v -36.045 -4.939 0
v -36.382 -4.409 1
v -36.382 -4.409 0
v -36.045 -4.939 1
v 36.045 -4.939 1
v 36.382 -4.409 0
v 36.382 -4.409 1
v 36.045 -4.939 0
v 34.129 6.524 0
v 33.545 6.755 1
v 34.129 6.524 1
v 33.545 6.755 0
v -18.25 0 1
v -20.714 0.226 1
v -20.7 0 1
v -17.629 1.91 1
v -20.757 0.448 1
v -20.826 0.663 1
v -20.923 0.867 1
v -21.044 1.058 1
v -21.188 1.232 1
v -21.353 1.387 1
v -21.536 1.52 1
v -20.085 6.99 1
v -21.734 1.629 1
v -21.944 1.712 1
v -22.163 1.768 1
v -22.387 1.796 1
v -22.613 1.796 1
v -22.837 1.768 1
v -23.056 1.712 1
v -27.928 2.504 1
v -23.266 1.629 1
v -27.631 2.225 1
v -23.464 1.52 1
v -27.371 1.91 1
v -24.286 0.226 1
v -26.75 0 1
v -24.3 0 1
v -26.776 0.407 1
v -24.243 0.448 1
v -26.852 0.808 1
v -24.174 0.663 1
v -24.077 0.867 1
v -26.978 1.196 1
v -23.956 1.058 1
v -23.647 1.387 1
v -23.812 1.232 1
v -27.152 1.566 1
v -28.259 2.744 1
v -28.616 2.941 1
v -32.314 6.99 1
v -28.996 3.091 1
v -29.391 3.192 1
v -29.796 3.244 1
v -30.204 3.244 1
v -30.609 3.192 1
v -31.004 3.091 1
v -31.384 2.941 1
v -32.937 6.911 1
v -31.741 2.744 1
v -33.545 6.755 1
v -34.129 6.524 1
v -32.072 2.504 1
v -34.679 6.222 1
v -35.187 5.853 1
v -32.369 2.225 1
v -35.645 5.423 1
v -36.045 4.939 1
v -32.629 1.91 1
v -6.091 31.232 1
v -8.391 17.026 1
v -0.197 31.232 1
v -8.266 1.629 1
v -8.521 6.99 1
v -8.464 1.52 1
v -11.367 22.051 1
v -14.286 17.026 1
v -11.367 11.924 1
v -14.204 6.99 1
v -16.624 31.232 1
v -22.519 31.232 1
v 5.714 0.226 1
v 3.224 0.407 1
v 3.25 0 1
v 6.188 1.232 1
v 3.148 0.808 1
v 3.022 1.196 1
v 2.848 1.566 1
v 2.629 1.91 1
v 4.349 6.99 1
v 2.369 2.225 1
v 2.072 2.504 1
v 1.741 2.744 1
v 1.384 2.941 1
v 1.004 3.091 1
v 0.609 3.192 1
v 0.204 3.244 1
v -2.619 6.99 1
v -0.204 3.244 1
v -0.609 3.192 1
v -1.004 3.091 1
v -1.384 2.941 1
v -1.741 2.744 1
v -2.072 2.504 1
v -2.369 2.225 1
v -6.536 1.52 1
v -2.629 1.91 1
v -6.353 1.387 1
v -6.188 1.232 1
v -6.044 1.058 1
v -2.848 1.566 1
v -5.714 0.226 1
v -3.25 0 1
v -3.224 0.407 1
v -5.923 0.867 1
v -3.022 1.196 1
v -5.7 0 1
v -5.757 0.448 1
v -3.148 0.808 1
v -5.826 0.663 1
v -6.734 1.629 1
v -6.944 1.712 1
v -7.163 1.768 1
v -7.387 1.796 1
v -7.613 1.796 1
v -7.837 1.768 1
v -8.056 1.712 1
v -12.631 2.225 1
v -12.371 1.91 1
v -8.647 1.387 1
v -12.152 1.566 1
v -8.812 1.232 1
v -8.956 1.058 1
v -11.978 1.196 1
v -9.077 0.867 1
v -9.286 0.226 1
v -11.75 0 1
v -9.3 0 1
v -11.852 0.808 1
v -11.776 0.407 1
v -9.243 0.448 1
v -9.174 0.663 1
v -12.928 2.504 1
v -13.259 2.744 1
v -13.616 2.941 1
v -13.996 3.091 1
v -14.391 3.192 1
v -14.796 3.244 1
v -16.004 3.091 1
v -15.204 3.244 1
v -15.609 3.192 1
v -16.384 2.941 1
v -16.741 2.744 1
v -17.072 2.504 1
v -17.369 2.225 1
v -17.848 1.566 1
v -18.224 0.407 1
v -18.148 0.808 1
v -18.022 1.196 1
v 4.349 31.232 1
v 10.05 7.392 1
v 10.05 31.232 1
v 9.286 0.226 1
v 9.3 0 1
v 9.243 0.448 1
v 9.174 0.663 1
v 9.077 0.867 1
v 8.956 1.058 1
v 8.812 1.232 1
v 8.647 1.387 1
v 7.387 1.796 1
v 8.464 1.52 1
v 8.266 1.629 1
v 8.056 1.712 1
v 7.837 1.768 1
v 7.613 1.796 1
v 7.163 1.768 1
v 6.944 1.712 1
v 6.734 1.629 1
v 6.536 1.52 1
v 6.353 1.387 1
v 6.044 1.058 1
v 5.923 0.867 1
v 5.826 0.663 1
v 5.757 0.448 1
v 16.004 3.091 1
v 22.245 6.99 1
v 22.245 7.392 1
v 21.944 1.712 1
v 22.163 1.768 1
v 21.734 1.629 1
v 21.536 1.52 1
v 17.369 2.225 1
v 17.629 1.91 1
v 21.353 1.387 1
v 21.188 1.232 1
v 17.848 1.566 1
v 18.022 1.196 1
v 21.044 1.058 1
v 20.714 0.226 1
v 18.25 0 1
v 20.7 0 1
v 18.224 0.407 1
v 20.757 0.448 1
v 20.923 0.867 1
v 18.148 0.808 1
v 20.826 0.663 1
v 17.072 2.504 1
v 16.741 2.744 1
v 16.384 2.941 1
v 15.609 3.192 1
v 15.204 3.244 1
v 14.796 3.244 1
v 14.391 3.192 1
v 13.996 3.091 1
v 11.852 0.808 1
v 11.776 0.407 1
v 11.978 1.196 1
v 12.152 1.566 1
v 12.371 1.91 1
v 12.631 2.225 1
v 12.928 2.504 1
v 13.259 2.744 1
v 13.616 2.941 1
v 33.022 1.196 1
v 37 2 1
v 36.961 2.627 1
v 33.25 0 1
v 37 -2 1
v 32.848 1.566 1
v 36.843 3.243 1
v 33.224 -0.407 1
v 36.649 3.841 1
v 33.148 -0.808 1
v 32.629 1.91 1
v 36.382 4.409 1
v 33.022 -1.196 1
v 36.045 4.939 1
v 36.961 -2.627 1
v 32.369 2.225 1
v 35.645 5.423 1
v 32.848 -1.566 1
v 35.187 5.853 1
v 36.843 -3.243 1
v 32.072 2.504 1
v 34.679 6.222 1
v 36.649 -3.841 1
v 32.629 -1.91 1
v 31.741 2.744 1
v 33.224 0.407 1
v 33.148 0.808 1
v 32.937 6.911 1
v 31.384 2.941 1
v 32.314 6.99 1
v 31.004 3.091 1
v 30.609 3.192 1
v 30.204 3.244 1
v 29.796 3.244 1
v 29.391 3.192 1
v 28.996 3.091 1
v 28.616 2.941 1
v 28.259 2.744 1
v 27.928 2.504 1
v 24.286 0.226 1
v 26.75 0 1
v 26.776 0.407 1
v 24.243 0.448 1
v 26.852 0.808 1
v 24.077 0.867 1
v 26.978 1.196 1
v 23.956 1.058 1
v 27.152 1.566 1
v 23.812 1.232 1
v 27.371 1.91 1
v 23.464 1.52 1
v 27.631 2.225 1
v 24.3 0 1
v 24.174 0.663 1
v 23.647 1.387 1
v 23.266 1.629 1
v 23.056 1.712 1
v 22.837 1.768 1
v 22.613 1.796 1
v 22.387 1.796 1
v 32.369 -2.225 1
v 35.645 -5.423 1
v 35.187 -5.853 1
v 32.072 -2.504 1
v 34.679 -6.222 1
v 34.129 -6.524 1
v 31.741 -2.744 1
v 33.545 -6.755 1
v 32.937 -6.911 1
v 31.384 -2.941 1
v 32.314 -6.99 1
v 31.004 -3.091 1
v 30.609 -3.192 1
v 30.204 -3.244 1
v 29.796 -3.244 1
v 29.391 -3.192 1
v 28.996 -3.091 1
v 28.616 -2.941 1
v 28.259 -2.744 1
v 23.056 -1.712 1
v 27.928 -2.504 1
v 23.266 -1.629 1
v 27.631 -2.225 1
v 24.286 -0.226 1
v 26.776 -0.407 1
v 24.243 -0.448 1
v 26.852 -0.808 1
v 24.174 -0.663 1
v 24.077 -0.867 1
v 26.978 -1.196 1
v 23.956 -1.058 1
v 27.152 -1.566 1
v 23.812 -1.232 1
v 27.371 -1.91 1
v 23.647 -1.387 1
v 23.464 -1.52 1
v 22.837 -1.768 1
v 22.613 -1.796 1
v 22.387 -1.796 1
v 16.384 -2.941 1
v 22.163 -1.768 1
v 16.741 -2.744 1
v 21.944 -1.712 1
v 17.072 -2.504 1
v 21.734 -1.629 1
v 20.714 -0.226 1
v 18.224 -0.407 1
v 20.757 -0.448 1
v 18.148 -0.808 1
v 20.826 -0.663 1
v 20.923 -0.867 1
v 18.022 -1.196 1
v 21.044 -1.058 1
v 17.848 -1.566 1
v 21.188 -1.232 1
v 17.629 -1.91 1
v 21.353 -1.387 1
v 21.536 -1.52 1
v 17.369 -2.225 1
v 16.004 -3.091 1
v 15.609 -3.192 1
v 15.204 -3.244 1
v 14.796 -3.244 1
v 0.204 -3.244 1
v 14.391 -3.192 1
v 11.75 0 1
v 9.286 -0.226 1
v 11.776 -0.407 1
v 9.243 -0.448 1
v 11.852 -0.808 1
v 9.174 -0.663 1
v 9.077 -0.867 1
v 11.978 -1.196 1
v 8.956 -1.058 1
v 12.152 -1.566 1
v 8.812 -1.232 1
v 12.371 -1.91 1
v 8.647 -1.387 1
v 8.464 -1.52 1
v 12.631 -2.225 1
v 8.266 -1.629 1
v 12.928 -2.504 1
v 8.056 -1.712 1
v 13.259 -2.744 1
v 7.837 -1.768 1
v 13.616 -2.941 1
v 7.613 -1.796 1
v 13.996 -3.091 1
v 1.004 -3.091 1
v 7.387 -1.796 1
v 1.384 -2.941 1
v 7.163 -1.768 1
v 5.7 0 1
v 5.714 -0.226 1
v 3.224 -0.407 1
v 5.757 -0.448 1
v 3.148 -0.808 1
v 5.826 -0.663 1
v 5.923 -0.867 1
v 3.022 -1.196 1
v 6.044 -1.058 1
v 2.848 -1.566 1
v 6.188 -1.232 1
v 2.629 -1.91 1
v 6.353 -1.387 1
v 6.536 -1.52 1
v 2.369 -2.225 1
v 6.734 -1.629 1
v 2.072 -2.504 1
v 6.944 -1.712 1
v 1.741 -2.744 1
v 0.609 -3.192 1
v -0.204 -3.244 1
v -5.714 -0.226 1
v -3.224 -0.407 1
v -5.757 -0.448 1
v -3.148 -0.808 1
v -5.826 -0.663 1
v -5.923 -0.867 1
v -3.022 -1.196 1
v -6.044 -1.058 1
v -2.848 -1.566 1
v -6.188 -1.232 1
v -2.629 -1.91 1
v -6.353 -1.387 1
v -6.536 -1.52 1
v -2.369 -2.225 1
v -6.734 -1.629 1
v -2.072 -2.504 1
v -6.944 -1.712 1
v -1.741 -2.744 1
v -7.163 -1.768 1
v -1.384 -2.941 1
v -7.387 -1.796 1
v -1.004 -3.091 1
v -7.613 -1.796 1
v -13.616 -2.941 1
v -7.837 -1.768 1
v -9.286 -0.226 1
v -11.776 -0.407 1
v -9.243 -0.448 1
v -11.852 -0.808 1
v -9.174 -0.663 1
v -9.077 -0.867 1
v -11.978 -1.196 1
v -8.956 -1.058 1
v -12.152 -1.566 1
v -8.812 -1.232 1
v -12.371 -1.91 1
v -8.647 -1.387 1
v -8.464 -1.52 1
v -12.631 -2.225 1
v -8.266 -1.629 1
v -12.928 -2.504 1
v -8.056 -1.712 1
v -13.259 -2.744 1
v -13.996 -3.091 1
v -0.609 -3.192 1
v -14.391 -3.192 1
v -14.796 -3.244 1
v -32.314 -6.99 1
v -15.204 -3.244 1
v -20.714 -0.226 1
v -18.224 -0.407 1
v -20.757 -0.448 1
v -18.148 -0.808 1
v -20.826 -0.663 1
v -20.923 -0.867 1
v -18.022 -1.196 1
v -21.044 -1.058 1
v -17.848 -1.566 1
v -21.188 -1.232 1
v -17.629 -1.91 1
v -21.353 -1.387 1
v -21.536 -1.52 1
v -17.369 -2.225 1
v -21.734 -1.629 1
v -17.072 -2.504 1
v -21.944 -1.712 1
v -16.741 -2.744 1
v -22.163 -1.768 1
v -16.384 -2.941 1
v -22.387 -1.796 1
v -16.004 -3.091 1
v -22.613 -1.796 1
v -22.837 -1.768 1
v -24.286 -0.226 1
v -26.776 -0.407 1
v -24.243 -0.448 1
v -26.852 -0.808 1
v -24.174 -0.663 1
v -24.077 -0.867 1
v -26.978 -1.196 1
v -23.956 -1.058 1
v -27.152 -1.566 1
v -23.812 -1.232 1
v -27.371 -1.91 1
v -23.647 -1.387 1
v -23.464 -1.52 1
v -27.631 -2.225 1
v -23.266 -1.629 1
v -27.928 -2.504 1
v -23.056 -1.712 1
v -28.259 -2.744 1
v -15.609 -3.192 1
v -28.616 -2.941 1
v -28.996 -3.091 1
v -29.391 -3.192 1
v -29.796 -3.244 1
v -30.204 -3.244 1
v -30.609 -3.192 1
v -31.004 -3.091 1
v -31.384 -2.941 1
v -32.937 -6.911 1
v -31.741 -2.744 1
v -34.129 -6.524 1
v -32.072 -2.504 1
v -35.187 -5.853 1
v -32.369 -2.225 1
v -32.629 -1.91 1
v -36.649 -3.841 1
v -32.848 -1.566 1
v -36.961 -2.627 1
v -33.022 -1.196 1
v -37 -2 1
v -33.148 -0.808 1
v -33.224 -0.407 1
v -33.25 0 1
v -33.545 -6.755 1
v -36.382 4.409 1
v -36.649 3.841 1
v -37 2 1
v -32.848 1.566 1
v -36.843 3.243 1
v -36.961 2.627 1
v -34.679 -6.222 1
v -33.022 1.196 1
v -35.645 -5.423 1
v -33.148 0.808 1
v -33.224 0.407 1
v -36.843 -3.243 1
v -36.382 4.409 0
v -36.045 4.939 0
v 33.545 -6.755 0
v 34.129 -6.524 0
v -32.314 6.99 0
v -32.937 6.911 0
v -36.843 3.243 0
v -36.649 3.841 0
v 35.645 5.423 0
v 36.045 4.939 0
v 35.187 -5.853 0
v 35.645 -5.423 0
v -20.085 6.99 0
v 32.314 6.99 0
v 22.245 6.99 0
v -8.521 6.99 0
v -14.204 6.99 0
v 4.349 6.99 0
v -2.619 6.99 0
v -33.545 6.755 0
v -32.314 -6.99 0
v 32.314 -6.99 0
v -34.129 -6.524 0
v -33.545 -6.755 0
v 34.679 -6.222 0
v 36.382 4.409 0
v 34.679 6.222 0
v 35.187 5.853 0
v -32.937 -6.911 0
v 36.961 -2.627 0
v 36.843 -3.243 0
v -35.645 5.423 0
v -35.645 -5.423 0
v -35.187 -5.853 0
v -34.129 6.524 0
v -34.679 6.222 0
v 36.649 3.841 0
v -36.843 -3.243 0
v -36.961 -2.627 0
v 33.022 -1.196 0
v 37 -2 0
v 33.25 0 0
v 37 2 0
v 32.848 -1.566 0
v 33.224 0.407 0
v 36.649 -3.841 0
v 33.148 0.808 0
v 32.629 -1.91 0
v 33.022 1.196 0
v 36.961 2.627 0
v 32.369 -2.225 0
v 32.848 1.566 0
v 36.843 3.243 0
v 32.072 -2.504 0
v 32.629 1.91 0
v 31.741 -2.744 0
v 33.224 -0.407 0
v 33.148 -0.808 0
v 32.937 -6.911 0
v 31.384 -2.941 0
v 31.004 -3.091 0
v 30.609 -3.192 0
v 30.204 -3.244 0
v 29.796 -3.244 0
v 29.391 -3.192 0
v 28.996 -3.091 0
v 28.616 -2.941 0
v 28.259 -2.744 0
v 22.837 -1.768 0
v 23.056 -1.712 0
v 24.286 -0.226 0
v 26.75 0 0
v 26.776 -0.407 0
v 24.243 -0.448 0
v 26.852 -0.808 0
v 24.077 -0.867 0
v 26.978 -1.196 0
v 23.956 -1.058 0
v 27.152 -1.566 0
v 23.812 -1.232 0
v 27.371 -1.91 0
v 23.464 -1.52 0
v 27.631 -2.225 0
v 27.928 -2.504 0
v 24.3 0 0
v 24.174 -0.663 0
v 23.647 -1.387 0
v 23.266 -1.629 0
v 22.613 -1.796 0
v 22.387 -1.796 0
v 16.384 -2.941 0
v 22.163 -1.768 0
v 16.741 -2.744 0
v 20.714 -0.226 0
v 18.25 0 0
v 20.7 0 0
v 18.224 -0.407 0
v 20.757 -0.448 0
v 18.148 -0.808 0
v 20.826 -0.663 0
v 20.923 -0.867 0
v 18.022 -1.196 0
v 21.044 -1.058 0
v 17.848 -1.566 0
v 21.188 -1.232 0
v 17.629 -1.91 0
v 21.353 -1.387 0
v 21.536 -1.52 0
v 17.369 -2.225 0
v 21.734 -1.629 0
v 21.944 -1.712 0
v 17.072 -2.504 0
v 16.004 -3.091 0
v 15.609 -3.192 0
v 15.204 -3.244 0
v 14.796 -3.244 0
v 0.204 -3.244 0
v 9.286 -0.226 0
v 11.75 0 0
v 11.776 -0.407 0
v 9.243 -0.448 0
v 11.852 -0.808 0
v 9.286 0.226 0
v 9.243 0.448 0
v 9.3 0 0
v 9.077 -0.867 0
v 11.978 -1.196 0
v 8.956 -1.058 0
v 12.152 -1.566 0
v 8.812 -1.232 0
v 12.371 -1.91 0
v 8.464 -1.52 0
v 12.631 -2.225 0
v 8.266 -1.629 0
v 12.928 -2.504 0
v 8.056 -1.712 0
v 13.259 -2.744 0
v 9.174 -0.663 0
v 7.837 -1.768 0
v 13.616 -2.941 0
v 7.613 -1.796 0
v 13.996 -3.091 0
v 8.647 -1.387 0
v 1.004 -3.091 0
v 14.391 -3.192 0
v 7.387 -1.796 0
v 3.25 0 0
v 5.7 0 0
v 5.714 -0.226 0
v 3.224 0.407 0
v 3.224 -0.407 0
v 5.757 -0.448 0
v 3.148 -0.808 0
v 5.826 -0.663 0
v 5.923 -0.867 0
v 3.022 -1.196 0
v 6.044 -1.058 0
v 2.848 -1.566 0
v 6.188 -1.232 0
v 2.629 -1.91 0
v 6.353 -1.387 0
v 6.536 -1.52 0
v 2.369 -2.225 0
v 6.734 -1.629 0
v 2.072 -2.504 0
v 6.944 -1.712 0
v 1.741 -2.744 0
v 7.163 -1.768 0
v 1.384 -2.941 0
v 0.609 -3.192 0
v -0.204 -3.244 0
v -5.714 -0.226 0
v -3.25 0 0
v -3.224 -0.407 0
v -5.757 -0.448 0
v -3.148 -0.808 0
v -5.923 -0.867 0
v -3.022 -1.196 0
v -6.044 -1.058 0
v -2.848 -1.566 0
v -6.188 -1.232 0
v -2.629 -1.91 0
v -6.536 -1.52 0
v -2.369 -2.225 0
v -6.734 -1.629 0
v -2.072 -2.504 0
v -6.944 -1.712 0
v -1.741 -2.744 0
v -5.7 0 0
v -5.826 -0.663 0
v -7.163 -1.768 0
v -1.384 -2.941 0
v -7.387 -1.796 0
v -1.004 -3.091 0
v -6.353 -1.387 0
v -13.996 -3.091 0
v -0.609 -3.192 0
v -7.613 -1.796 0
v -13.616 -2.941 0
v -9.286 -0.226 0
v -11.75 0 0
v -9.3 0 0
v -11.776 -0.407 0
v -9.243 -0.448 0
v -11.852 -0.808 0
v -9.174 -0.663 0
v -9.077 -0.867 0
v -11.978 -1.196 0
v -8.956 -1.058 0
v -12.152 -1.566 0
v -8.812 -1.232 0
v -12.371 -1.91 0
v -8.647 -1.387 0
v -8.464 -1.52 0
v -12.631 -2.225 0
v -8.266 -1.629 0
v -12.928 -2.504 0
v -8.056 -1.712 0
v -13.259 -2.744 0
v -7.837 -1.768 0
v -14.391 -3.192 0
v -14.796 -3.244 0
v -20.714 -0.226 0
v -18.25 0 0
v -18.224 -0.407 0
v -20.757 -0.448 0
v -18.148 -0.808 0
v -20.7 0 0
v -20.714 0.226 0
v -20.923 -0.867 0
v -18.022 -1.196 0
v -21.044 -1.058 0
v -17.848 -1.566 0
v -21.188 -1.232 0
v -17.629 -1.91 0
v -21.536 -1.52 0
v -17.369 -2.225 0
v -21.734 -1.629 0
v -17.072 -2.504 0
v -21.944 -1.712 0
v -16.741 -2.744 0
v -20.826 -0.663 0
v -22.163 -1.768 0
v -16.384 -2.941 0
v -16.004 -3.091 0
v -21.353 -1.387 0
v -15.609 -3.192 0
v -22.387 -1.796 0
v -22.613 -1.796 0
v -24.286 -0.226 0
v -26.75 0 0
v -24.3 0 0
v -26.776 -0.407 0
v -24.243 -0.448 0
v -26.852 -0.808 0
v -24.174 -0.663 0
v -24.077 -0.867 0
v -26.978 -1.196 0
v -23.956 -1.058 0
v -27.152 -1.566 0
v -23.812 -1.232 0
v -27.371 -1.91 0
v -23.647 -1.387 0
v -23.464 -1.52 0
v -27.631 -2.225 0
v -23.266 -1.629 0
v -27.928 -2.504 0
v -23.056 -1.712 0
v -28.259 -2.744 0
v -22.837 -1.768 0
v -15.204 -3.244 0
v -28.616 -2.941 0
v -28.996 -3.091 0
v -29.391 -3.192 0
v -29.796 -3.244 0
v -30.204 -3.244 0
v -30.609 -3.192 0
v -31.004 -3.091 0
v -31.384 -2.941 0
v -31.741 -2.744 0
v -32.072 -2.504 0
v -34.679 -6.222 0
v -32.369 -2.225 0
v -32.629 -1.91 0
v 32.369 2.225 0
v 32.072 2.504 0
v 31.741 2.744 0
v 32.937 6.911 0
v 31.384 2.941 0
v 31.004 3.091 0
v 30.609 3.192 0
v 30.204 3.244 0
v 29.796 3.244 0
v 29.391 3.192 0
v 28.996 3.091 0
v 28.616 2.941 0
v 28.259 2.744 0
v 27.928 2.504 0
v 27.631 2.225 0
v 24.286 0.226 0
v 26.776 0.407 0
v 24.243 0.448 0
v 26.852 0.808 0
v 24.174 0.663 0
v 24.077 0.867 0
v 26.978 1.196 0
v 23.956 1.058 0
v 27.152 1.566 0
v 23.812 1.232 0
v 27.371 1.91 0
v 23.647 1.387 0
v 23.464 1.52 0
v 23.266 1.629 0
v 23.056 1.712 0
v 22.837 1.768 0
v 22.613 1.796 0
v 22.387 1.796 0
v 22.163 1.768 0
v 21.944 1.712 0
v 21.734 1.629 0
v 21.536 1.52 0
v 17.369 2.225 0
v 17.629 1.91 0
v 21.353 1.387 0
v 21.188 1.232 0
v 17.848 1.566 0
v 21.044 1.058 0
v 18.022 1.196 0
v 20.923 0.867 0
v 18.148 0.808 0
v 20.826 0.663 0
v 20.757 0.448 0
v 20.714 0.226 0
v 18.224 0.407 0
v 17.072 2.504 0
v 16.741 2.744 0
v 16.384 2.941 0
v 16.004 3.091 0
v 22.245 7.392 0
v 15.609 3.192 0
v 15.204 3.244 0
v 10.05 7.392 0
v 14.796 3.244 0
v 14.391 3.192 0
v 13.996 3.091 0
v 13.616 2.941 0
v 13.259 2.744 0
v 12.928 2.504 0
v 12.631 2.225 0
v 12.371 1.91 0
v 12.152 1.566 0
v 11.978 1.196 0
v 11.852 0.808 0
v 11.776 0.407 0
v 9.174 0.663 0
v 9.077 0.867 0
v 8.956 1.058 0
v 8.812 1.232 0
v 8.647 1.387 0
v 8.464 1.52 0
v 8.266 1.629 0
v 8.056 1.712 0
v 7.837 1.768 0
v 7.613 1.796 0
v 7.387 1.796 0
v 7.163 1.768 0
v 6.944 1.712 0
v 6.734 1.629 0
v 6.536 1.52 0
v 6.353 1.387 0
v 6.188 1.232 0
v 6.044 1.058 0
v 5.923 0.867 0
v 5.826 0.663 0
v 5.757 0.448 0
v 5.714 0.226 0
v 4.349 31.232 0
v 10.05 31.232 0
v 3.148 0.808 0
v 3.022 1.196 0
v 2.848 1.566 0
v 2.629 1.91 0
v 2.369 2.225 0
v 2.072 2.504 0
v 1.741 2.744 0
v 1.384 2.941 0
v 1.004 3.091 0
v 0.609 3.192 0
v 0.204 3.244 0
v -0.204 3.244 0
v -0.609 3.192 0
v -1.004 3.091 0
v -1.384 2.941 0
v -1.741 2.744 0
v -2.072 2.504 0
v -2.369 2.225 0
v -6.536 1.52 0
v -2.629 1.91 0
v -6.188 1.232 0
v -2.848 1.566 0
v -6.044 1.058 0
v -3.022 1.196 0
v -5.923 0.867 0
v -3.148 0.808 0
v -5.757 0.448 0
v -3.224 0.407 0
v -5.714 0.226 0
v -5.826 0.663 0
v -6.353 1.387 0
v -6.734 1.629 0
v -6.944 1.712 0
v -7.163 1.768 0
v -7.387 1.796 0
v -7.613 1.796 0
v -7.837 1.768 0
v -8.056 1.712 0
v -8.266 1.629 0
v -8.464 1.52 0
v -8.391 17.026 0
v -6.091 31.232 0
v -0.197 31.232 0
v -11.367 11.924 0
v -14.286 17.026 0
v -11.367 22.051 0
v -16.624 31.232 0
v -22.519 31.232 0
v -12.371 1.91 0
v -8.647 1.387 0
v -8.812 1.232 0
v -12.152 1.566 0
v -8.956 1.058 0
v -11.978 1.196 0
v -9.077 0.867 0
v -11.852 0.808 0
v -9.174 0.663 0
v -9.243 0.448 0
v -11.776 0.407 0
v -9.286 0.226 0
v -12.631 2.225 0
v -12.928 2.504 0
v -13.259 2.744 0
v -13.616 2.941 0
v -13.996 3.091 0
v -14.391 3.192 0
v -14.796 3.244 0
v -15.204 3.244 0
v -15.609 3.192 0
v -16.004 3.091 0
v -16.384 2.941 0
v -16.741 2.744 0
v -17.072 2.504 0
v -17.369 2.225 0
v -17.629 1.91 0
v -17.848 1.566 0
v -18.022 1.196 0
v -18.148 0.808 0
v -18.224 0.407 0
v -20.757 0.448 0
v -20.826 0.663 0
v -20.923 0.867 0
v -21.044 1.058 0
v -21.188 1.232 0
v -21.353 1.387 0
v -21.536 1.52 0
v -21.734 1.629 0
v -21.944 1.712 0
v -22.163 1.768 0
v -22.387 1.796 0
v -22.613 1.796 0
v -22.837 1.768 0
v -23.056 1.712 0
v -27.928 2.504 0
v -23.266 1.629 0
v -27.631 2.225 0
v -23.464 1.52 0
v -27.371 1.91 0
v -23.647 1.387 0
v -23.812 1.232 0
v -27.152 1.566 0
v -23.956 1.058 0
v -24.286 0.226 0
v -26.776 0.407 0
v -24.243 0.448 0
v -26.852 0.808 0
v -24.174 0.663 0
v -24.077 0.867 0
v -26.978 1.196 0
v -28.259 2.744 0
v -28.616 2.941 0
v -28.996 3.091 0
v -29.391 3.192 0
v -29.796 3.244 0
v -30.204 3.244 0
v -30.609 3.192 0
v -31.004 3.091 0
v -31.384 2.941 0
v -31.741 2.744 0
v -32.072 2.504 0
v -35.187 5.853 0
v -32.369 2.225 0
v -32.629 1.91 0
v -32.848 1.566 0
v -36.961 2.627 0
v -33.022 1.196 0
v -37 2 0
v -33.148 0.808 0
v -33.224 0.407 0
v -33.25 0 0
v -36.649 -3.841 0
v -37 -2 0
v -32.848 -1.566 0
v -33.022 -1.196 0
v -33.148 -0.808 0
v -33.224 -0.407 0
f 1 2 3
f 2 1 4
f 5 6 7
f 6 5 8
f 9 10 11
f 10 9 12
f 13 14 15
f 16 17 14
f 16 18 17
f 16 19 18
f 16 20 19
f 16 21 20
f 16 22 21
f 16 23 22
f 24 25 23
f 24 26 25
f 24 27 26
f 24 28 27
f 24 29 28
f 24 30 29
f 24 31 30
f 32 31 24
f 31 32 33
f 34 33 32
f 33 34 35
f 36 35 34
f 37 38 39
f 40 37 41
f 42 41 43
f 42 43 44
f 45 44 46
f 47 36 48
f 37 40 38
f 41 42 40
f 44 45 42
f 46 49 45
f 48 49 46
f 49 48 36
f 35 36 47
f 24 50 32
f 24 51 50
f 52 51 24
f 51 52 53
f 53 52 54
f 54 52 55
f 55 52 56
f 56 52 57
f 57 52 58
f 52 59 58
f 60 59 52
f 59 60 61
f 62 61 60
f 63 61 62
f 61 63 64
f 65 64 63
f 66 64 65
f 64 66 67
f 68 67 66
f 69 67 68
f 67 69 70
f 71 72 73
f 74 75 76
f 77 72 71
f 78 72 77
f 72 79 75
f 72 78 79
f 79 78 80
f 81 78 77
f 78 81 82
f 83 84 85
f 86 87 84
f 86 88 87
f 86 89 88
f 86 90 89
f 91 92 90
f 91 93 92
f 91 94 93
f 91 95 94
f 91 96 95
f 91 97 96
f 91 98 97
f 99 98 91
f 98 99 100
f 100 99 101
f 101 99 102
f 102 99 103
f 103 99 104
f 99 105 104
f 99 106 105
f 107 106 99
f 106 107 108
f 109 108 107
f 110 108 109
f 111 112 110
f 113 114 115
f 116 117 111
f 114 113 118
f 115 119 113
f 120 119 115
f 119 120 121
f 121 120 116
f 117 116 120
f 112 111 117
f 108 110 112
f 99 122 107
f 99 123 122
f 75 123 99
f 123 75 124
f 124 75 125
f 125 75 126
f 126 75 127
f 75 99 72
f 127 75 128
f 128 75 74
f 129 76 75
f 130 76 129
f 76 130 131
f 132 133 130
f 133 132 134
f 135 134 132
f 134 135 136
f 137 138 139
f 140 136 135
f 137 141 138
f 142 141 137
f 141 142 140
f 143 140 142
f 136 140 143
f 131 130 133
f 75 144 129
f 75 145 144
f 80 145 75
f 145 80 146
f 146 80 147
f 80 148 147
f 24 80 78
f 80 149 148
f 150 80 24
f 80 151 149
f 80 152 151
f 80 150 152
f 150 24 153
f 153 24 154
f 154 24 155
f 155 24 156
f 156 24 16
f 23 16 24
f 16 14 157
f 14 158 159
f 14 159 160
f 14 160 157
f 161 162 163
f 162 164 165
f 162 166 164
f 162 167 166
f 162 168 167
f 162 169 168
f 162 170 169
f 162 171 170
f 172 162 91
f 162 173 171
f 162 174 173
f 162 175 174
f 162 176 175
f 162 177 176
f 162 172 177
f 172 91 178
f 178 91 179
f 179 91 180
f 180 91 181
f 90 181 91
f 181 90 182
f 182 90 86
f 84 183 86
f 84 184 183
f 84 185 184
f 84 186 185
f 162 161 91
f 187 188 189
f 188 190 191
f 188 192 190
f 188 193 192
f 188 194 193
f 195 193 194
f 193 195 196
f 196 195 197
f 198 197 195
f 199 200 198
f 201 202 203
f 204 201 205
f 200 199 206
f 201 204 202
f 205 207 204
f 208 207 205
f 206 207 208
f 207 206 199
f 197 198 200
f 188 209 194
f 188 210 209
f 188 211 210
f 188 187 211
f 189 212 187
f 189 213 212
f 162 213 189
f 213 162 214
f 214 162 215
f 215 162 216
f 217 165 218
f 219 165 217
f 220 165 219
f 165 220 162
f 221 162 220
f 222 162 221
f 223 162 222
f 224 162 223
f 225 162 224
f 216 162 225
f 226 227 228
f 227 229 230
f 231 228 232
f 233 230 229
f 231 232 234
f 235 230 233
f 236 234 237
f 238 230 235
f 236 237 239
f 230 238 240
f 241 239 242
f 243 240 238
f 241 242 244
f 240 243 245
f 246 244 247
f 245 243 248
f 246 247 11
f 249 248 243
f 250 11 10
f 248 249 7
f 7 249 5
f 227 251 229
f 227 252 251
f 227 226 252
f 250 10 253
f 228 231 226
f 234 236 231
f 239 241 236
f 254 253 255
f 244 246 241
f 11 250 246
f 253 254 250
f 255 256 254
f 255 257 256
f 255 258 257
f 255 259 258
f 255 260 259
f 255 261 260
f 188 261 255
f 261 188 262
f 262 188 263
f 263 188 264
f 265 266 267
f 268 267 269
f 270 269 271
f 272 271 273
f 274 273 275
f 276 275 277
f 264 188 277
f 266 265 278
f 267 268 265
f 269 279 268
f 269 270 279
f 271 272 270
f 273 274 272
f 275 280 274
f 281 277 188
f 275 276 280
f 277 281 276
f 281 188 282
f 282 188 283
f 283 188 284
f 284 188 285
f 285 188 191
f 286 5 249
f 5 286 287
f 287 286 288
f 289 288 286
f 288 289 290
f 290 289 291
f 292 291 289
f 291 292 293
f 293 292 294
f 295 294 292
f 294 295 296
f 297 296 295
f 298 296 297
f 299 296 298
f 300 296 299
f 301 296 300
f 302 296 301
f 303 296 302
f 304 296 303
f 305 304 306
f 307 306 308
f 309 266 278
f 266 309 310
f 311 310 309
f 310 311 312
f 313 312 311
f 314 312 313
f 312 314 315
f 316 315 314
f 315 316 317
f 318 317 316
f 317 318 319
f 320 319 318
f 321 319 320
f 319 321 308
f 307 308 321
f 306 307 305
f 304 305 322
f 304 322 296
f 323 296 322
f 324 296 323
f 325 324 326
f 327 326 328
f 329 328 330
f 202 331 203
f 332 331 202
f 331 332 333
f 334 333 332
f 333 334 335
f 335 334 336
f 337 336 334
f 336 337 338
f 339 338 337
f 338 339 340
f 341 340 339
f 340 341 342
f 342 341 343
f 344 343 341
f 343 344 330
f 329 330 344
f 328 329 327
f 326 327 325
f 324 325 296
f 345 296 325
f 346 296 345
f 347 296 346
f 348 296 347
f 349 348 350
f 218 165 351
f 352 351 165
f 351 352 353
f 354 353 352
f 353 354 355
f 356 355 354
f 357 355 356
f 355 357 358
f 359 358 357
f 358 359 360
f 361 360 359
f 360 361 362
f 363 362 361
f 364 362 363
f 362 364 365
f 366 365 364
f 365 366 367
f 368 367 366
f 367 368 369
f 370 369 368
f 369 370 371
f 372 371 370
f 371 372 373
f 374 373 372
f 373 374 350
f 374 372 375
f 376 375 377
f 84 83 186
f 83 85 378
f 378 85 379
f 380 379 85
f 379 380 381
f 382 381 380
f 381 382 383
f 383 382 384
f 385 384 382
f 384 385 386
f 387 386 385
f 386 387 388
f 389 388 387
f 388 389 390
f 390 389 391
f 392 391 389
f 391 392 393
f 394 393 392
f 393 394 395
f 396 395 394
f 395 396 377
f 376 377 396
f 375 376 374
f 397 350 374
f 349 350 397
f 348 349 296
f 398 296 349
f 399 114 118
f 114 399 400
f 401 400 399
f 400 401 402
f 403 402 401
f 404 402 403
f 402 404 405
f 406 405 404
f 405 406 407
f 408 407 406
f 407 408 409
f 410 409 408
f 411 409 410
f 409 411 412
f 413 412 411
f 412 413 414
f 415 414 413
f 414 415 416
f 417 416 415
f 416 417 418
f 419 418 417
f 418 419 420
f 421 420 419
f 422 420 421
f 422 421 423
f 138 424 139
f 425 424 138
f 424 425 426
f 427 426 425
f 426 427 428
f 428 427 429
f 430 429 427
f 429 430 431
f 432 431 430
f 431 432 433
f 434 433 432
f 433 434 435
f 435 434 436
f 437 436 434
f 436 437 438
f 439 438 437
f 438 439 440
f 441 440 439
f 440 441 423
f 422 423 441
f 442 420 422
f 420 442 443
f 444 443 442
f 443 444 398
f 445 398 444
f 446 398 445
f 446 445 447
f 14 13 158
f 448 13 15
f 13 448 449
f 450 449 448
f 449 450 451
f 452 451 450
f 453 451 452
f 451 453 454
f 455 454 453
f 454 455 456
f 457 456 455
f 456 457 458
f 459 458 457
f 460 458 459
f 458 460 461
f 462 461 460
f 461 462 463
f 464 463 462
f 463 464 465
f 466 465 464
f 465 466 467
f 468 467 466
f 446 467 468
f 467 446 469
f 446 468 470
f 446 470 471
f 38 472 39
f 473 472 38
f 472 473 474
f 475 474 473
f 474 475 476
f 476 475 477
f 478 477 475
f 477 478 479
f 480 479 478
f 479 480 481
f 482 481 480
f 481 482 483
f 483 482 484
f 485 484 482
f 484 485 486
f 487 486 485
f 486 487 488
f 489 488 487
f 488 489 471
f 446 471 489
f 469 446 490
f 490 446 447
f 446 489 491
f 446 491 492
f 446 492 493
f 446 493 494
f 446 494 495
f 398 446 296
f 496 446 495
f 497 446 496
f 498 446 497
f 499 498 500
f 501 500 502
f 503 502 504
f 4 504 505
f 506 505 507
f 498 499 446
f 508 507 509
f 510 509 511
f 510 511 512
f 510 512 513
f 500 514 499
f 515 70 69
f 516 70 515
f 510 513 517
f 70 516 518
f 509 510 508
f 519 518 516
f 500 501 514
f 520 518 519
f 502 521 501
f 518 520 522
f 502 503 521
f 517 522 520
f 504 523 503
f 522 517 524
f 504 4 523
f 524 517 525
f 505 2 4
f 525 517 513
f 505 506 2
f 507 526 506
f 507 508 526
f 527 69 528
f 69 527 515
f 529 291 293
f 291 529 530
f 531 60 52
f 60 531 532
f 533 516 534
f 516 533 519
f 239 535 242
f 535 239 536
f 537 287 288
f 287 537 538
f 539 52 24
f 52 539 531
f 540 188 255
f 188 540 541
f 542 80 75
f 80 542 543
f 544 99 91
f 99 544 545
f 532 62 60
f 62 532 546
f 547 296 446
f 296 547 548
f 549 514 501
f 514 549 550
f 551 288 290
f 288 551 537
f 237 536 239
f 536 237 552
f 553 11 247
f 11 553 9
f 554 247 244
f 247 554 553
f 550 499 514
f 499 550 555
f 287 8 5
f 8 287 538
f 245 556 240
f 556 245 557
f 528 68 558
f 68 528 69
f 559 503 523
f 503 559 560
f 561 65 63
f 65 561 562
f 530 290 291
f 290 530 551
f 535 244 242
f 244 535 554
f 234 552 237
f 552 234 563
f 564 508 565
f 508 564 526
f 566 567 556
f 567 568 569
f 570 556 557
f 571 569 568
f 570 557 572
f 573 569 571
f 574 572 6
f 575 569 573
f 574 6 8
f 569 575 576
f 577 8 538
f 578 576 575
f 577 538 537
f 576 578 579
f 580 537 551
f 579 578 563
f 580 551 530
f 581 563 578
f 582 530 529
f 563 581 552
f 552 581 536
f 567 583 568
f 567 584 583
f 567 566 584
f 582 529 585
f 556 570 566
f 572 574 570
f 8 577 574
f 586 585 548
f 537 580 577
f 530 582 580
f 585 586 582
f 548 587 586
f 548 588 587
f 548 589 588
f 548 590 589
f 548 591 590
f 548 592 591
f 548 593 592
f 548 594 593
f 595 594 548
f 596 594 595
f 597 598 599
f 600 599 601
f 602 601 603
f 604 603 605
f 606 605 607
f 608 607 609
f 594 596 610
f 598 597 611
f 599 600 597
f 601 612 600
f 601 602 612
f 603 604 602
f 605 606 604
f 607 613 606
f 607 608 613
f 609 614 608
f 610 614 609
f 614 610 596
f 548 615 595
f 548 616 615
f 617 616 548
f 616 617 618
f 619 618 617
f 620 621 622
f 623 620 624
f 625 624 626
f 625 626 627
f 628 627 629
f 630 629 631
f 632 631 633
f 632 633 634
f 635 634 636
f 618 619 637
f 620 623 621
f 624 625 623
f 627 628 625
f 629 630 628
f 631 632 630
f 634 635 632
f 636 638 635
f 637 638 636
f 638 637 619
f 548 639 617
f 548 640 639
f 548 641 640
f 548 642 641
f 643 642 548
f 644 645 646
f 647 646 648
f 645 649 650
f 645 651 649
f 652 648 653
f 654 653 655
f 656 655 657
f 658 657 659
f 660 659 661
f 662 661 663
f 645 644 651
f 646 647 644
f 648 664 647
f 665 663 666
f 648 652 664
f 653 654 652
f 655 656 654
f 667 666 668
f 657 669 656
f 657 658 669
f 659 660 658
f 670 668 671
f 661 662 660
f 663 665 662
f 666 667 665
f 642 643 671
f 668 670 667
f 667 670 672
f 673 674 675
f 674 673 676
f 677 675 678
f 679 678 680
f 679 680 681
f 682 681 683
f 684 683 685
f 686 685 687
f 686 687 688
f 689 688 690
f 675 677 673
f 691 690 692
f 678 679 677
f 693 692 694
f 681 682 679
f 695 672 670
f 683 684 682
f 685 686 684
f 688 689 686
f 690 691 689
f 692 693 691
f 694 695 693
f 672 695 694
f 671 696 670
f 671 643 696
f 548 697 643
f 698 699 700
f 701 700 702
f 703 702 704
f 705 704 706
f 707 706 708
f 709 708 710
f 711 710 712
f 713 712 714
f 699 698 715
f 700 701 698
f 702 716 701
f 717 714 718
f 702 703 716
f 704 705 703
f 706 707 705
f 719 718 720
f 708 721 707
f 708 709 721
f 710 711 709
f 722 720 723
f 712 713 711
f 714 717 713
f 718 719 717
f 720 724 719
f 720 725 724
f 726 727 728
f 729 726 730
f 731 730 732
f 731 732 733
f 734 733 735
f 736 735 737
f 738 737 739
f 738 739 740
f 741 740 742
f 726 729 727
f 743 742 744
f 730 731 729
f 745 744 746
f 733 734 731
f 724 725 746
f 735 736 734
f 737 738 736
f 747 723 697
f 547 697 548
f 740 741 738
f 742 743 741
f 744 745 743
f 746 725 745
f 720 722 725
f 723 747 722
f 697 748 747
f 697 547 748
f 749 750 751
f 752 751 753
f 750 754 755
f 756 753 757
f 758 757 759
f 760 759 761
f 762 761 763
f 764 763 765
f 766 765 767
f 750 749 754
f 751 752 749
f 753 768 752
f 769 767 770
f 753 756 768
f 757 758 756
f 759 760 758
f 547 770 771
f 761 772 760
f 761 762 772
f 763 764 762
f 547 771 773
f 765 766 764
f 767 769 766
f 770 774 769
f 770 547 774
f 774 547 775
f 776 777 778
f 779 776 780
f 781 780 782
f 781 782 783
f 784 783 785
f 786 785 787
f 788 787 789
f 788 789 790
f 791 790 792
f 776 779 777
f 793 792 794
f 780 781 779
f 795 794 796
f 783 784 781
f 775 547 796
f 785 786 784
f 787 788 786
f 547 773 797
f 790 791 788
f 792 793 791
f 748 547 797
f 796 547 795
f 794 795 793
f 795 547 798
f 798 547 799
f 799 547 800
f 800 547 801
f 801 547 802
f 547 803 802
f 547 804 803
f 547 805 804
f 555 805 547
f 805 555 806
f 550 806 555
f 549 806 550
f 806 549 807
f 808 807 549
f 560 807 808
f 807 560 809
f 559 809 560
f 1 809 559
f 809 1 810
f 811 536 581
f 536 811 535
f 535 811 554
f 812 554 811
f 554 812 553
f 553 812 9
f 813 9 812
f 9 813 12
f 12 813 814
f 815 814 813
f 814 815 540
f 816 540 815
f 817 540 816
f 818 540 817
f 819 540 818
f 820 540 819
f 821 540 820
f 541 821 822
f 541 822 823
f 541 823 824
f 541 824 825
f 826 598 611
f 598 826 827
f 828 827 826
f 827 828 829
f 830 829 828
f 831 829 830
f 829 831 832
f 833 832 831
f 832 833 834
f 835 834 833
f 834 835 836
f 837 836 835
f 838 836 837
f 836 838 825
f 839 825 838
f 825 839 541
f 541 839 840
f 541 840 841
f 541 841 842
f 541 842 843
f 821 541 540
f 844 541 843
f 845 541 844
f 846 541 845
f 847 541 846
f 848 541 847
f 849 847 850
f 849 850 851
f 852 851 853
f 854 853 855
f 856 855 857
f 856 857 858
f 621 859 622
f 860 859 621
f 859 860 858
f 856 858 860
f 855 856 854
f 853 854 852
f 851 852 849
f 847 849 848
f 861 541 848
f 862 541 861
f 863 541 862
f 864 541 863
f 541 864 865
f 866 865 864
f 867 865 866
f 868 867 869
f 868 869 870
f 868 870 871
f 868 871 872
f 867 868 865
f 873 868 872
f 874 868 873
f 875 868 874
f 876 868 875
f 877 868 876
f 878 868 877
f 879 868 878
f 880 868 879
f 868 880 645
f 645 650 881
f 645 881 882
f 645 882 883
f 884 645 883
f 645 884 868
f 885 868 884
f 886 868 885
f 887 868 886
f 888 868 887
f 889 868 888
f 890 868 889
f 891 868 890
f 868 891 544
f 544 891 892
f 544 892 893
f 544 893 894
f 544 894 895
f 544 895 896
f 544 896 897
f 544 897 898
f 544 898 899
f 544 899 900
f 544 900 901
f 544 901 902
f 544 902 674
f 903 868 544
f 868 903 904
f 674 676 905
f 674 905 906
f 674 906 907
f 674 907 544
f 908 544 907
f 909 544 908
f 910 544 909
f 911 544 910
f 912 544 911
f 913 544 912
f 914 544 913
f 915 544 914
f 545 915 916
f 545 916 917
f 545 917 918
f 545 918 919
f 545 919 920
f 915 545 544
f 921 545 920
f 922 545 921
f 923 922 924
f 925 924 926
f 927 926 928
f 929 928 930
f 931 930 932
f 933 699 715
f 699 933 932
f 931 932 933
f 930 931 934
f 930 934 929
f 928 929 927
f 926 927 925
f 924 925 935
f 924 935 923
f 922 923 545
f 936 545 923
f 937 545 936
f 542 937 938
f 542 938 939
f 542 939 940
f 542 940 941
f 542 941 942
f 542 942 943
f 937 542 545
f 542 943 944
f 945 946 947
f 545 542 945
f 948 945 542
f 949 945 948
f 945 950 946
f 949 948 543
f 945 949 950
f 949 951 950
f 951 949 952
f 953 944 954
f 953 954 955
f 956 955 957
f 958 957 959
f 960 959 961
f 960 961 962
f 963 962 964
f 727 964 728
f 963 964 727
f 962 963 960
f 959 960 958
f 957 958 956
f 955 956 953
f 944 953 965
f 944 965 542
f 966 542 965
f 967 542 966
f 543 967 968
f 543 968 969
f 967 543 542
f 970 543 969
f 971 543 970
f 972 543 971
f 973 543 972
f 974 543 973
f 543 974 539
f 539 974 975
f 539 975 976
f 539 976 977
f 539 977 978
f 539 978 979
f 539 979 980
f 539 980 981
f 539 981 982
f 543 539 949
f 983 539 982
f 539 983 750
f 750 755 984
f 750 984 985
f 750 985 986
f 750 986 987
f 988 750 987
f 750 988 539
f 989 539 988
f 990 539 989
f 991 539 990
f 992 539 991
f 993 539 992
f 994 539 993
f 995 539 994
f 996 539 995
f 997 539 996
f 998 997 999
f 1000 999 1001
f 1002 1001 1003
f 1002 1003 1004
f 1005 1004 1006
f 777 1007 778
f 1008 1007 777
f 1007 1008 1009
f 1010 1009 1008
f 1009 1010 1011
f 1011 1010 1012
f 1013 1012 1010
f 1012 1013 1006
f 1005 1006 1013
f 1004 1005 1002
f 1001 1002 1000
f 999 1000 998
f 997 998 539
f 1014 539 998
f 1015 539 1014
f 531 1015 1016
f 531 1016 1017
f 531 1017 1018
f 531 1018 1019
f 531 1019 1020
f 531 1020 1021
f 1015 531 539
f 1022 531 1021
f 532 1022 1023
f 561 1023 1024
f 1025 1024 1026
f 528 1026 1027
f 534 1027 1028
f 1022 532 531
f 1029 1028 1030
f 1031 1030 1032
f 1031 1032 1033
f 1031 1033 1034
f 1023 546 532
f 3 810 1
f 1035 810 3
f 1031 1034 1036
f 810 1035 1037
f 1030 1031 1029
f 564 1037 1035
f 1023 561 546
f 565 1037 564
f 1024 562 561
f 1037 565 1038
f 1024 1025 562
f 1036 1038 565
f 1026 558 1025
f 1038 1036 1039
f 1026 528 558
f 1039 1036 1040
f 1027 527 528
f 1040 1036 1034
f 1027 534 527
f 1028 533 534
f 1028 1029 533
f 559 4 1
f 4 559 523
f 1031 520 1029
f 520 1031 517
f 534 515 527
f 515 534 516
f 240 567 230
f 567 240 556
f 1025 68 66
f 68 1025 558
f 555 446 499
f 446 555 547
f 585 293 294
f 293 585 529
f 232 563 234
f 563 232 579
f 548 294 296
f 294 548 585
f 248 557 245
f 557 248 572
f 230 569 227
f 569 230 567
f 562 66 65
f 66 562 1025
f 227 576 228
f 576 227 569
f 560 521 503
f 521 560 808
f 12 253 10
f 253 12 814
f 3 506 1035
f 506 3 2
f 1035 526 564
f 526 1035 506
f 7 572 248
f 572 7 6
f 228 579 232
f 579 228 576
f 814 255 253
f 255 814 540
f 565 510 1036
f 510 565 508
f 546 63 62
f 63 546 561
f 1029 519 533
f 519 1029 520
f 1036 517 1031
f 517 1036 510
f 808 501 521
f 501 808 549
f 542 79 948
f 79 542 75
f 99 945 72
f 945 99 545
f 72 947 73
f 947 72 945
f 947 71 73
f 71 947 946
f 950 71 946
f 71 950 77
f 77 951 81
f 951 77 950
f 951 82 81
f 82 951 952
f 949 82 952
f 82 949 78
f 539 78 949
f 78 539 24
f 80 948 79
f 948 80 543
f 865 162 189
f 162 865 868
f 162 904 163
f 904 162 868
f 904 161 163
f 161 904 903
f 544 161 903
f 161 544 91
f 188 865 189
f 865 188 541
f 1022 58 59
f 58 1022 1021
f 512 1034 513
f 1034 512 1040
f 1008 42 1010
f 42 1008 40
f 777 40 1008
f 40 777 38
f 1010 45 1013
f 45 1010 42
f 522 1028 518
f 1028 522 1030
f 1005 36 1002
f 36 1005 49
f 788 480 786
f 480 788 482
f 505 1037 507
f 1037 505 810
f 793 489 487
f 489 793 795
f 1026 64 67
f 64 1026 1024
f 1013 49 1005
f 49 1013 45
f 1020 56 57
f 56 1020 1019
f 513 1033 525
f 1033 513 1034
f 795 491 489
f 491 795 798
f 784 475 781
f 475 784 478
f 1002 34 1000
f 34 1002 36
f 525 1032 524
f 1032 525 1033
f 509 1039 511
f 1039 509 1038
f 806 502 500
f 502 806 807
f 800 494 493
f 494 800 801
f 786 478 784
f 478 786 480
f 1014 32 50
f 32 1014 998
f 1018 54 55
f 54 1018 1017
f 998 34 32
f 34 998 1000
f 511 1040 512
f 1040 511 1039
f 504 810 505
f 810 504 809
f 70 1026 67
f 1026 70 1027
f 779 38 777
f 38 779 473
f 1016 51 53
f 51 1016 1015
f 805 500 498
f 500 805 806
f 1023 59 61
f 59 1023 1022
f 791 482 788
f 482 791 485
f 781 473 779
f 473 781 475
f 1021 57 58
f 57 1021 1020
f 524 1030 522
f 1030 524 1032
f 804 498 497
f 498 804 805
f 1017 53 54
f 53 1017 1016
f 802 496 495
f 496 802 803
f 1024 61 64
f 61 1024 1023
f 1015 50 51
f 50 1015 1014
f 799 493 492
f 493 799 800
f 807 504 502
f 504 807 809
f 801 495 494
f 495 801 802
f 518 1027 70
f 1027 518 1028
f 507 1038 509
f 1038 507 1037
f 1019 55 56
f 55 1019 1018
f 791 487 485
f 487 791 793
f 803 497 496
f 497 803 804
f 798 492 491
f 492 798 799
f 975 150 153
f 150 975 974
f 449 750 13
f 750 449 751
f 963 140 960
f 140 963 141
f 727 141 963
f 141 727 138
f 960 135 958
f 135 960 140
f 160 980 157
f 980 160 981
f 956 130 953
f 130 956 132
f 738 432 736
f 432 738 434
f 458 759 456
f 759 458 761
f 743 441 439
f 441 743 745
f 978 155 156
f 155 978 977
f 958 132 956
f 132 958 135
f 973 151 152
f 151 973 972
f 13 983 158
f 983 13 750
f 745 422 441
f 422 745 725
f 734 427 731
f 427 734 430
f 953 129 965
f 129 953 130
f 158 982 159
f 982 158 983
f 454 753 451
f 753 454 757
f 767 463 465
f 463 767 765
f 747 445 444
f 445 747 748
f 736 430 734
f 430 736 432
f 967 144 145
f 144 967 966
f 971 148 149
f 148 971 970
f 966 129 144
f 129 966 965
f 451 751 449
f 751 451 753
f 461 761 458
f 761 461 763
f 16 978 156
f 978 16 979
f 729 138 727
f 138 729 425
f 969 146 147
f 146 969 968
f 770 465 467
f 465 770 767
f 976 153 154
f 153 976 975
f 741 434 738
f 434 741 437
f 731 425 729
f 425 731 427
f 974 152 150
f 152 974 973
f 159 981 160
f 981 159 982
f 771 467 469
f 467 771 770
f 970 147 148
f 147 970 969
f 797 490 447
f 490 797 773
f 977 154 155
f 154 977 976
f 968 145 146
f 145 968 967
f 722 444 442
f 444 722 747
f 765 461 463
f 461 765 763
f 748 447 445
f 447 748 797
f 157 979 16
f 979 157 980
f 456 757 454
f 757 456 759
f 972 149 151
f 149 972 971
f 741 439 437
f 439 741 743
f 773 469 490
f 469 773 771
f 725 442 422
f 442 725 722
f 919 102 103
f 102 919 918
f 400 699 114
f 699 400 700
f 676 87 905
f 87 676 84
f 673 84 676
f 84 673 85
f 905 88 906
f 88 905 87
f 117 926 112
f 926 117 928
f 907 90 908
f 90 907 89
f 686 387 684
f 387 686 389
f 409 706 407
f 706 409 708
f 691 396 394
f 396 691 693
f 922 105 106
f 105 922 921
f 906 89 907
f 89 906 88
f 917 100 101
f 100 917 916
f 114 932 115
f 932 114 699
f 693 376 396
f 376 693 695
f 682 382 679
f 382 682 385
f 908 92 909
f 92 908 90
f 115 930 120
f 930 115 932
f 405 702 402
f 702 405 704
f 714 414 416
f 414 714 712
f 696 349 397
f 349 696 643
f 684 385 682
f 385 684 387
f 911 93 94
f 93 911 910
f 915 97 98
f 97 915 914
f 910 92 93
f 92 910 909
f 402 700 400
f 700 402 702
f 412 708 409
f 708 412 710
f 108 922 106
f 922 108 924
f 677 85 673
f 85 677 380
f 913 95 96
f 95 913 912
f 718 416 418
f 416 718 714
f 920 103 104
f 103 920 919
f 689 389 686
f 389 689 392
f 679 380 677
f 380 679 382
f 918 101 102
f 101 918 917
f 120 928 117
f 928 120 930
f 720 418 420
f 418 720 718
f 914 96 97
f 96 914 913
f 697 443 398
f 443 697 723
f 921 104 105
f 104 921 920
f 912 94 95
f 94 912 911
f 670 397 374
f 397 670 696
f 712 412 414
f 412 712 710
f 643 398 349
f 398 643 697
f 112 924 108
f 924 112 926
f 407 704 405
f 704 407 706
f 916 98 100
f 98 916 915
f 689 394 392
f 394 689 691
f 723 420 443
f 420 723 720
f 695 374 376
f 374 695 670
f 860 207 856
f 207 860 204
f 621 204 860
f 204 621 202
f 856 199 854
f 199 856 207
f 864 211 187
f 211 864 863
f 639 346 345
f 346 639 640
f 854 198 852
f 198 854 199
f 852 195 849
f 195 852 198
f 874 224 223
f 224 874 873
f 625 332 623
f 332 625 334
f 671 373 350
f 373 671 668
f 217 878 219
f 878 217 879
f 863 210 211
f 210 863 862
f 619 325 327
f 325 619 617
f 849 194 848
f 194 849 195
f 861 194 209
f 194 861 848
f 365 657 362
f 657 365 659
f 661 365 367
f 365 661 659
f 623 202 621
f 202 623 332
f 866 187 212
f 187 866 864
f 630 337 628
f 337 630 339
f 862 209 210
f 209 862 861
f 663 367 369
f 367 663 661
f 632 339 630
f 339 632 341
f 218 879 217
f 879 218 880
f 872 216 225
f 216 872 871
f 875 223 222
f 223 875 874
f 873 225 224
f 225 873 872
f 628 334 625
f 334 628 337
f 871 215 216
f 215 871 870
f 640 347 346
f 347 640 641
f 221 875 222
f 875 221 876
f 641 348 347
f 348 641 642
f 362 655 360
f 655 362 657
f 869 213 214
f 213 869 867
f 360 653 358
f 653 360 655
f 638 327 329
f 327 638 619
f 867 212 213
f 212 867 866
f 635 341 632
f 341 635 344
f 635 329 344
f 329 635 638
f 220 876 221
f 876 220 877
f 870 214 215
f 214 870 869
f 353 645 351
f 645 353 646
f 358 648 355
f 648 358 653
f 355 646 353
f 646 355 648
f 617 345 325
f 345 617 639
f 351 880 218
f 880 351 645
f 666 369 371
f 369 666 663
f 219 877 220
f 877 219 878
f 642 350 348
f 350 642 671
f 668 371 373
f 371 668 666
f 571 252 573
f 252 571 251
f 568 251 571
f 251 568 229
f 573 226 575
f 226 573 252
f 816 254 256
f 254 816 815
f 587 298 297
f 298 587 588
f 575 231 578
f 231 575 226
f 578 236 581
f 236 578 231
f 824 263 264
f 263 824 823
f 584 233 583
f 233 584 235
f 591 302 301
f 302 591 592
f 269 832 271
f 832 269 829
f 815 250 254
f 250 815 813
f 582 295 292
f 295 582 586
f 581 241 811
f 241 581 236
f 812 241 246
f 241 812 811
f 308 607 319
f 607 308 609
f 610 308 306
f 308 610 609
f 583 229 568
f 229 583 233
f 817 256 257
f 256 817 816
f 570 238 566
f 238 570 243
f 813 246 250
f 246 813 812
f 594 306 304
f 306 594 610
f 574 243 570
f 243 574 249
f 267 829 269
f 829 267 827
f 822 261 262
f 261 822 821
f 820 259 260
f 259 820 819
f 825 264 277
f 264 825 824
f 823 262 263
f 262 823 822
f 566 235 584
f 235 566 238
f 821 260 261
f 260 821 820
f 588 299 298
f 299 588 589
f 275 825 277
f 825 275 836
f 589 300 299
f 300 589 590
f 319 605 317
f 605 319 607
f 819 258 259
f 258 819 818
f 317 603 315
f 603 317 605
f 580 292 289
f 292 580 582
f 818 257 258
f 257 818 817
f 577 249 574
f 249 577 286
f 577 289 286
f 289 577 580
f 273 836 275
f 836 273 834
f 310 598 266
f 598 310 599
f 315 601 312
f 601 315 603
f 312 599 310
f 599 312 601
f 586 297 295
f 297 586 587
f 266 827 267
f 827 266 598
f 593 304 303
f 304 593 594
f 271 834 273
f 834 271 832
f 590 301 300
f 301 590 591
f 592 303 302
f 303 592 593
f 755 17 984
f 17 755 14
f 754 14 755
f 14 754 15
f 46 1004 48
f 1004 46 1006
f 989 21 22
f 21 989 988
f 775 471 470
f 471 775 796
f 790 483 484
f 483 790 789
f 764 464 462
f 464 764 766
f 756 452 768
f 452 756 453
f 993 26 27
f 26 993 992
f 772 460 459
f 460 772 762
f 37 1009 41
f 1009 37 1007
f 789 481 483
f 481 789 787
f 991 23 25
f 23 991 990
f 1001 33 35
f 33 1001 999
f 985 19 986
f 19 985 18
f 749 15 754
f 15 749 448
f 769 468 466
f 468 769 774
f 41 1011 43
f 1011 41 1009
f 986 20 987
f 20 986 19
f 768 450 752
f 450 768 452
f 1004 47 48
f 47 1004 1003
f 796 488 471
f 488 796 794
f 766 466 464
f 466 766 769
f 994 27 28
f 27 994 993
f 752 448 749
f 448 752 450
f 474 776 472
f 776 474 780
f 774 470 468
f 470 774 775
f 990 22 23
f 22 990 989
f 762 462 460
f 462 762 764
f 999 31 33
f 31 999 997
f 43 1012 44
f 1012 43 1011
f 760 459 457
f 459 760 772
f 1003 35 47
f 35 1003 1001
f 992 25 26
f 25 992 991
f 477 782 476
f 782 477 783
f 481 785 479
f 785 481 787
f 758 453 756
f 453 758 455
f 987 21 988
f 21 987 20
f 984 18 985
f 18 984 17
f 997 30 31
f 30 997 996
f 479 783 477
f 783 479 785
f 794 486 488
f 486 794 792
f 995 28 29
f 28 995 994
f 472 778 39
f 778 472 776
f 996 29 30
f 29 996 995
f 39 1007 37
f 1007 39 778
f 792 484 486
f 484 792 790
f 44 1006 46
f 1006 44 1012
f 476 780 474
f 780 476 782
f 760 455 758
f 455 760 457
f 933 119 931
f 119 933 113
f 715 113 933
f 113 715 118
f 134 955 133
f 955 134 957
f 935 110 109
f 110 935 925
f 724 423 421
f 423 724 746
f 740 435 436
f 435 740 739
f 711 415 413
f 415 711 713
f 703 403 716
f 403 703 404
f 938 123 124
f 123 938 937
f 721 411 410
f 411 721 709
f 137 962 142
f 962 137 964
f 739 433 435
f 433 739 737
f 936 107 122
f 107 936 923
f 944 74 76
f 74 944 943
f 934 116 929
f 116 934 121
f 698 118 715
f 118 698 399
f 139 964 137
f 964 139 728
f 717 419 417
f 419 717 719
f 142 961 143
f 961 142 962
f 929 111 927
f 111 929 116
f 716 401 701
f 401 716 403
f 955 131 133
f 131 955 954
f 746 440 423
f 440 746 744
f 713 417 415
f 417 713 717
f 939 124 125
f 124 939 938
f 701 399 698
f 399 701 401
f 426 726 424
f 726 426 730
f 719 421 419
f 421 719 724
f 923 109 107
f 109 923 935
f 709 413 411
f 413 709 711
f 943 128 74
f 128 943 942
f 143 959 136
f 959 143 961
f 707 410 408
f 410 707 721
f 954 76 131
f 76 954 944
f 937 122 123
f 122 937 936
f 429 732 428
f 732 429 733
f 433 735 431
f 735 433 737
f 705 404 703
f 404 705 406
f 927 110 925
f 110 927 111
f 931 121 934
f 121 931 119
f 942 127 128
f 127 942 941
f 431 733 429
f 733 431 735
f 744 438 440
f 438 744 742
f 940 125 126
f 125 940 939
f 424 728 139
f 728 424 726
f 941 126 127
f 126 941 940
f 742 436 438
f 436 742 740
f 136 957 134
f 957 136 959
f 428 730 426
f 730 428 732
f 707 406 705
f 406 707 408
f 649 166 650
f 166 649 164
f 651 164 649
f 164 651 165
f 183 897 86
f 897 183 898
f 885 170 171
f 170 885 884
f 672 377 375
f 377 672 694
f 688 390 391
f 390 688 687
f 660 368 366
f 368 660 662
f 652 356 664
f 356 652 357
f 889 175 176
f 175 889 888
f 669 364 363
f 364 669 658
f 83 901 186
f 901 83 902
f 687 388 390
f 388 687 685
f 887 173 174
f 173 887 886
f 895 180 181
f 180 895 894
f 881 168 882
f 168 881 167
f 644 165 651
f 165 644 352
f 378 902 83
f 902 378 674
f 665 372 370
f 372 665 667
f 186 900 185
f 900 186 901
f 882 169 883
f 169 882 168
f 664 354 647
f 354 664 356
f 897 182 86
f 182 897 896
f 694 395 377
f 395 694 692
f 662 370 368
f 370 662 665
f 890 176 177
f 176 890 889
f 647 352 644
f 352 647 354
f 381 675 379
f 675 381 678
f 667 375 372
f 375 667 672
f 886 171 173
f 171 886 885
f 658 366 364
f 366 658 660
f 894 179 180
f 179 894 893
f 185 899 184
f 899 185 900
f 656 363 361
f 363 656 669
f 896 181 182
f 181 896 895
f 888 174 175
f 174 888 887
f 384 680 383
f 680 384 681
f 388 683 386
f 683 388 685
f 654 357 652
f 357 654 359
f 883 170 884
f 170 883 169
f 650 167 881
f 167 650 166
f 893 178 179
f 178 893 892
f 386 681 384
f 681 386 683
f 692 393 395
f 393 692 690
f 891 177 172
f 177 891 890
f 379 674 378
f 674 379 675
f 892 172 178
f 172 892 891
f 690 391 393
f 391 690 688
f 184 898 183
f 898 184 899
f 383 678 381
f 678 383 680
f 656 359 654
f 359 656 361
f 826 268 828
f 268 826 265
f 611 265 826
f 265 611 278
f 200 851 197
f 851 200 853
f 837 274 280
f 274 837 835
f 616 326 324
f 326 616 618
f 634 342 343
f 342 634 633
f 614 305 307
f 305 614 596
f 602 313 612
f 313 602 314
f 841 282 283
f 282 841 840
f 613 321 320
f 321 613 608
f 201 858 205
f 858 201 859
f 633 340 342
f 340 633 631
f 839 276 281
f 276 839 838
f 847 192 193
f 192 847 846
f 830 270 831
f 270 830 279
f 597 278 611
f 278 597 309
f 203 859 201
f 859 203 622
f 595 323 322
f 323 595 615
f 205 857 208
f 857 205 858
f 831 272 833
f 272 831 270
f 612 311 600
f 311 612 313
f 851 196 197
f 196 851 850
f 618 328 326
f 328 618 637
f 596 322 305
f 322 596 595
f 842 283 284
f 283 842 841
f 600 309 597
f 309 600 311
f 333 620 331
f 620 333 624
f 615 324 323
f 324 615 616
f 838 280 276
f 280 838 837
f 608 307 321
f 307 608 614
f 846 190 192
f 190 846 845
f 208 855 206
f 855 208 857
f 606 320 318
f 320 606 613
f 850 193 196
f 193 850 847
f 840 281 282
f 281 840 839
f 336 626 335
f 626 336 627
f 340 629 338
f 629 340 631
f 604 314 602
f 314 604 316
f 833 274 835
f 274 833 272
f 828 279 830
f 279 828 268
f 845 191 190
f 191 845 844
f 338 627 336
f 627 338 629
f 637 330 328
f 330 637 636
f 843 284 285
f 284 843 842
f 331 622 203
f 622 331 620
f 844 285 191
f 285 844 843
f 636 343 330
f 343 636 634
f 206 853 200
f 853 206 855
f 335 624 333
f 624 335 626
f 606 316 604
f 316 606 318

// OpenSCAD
$fn = 50;


difference() {
	union() {
		hull() {
			translate(v = [-32.0000000000, 2.0000000000, 0]) {
				cylinder(h = 1, r = 5);
			}
			translate(v = [32.0000000000, 2.0000000000, 0]) {
				cylinder(h = 1, r = 5);
			}
			translate(v = [-32.0000000000, -2.0000000000, 0]) {
				cylinder(h = 1, r = 5);
			}
			translate(v = [32.0000000000, -2.0000000000, 0]) {
				cylinder(h = 1, r = 5);
			}
		}
		translate(v = [0, 30.5555555556, 0]) {
			linear_extrude(height = 1) {
				text(font = "DejaVu Sans Mono:style=Bold", halign = "center", size = 28.5000000000, text = "XL", valign = "top");
			}
		}
	}
	union() {
		translate(v = [-30.0000000000, 0.0000000000, 0]) {
			translate(v = [0, 0, -100]) {
				cylinder(h = 200, r = 3.2500000000);
			}
		}
		translate(v = [-15.0000000000, 0.0000000000, 0]) {
			translate(v = [0, 0, -100]) {
				cylinder(h = 200, r = 3.2500000000);
			}
		}
		translate(v = [0, 0, -100]) {
			cylinder(h = 200, r = 3.2500000000);
		}
		translate(v = [15.0000000000, 0.0000000000, 0]) {
			translate(v = [0, 0, -100]) {
				cylinder(h = 200, r = 3.2500000000);
			}
		}
		translate(v = [30.0000000000, 0.0000000000, 0]) {
			translate(v = [0, 0, -100]) {
				cylinder(h = 200, r = 3.2500000000);
			}
		}
		translate(v = [-30.0000000000, 0.0000000000, 0]) {
			translate(v = [0, 0, -100]) {
				cylinder(h = 200, r = 1.8000000000);
			}
		}
		translate(v = [-22.5000000000, 0.0000000000, 0]) {
			translate(v = [0, 0, -100]) {
				cylinder(h = 200, r = 1.8000000000);
			}
		}
		translate(v = [-15.0000000000, 0.0000000000, 0]) {
			translate(v = [0, 0, -100]) {
				cylinder(h = 200, r = 1.8000000000);
			}
		}
		translate(v = [-7.5000000000, 0.0000000000, 0]) {
			translate(v = [0, 0, -100]) {
				cylinder(h = 200, r = 1.8000000000);
			}
		}
		translate(v = [0, 0, -100]) {
			cylinder(h = 200, r = 1.8000000000);
		}
		translate(v = [7.5000000000, 0.0000000000, 0]) {
			translate(v = [0, 0, -100]) {
				cylinder(h = 200, r = 1.8000000000);
			}
		}
		translate(v = [15.0000000000, 0.0000000000, 0]) {
			translate(v = [0, 0, -100]) {
				cylinder(h = 200, r = 1.8000000000);
			}
		}
		translate(v = [22.5000000000, 0.0000000000, 0]) {
			translate(v = [0, 0, -100]) {
				cylinder(h = 200, r = 1.8000000000);
			}
		}
		translate(v = [30.0000000000, 0.0000000000, 0]) {
			translate(v = [0, 0, -100]) {
				cylinder(h = 200, r = 1.8000000000);
			}
		}
	}
}
